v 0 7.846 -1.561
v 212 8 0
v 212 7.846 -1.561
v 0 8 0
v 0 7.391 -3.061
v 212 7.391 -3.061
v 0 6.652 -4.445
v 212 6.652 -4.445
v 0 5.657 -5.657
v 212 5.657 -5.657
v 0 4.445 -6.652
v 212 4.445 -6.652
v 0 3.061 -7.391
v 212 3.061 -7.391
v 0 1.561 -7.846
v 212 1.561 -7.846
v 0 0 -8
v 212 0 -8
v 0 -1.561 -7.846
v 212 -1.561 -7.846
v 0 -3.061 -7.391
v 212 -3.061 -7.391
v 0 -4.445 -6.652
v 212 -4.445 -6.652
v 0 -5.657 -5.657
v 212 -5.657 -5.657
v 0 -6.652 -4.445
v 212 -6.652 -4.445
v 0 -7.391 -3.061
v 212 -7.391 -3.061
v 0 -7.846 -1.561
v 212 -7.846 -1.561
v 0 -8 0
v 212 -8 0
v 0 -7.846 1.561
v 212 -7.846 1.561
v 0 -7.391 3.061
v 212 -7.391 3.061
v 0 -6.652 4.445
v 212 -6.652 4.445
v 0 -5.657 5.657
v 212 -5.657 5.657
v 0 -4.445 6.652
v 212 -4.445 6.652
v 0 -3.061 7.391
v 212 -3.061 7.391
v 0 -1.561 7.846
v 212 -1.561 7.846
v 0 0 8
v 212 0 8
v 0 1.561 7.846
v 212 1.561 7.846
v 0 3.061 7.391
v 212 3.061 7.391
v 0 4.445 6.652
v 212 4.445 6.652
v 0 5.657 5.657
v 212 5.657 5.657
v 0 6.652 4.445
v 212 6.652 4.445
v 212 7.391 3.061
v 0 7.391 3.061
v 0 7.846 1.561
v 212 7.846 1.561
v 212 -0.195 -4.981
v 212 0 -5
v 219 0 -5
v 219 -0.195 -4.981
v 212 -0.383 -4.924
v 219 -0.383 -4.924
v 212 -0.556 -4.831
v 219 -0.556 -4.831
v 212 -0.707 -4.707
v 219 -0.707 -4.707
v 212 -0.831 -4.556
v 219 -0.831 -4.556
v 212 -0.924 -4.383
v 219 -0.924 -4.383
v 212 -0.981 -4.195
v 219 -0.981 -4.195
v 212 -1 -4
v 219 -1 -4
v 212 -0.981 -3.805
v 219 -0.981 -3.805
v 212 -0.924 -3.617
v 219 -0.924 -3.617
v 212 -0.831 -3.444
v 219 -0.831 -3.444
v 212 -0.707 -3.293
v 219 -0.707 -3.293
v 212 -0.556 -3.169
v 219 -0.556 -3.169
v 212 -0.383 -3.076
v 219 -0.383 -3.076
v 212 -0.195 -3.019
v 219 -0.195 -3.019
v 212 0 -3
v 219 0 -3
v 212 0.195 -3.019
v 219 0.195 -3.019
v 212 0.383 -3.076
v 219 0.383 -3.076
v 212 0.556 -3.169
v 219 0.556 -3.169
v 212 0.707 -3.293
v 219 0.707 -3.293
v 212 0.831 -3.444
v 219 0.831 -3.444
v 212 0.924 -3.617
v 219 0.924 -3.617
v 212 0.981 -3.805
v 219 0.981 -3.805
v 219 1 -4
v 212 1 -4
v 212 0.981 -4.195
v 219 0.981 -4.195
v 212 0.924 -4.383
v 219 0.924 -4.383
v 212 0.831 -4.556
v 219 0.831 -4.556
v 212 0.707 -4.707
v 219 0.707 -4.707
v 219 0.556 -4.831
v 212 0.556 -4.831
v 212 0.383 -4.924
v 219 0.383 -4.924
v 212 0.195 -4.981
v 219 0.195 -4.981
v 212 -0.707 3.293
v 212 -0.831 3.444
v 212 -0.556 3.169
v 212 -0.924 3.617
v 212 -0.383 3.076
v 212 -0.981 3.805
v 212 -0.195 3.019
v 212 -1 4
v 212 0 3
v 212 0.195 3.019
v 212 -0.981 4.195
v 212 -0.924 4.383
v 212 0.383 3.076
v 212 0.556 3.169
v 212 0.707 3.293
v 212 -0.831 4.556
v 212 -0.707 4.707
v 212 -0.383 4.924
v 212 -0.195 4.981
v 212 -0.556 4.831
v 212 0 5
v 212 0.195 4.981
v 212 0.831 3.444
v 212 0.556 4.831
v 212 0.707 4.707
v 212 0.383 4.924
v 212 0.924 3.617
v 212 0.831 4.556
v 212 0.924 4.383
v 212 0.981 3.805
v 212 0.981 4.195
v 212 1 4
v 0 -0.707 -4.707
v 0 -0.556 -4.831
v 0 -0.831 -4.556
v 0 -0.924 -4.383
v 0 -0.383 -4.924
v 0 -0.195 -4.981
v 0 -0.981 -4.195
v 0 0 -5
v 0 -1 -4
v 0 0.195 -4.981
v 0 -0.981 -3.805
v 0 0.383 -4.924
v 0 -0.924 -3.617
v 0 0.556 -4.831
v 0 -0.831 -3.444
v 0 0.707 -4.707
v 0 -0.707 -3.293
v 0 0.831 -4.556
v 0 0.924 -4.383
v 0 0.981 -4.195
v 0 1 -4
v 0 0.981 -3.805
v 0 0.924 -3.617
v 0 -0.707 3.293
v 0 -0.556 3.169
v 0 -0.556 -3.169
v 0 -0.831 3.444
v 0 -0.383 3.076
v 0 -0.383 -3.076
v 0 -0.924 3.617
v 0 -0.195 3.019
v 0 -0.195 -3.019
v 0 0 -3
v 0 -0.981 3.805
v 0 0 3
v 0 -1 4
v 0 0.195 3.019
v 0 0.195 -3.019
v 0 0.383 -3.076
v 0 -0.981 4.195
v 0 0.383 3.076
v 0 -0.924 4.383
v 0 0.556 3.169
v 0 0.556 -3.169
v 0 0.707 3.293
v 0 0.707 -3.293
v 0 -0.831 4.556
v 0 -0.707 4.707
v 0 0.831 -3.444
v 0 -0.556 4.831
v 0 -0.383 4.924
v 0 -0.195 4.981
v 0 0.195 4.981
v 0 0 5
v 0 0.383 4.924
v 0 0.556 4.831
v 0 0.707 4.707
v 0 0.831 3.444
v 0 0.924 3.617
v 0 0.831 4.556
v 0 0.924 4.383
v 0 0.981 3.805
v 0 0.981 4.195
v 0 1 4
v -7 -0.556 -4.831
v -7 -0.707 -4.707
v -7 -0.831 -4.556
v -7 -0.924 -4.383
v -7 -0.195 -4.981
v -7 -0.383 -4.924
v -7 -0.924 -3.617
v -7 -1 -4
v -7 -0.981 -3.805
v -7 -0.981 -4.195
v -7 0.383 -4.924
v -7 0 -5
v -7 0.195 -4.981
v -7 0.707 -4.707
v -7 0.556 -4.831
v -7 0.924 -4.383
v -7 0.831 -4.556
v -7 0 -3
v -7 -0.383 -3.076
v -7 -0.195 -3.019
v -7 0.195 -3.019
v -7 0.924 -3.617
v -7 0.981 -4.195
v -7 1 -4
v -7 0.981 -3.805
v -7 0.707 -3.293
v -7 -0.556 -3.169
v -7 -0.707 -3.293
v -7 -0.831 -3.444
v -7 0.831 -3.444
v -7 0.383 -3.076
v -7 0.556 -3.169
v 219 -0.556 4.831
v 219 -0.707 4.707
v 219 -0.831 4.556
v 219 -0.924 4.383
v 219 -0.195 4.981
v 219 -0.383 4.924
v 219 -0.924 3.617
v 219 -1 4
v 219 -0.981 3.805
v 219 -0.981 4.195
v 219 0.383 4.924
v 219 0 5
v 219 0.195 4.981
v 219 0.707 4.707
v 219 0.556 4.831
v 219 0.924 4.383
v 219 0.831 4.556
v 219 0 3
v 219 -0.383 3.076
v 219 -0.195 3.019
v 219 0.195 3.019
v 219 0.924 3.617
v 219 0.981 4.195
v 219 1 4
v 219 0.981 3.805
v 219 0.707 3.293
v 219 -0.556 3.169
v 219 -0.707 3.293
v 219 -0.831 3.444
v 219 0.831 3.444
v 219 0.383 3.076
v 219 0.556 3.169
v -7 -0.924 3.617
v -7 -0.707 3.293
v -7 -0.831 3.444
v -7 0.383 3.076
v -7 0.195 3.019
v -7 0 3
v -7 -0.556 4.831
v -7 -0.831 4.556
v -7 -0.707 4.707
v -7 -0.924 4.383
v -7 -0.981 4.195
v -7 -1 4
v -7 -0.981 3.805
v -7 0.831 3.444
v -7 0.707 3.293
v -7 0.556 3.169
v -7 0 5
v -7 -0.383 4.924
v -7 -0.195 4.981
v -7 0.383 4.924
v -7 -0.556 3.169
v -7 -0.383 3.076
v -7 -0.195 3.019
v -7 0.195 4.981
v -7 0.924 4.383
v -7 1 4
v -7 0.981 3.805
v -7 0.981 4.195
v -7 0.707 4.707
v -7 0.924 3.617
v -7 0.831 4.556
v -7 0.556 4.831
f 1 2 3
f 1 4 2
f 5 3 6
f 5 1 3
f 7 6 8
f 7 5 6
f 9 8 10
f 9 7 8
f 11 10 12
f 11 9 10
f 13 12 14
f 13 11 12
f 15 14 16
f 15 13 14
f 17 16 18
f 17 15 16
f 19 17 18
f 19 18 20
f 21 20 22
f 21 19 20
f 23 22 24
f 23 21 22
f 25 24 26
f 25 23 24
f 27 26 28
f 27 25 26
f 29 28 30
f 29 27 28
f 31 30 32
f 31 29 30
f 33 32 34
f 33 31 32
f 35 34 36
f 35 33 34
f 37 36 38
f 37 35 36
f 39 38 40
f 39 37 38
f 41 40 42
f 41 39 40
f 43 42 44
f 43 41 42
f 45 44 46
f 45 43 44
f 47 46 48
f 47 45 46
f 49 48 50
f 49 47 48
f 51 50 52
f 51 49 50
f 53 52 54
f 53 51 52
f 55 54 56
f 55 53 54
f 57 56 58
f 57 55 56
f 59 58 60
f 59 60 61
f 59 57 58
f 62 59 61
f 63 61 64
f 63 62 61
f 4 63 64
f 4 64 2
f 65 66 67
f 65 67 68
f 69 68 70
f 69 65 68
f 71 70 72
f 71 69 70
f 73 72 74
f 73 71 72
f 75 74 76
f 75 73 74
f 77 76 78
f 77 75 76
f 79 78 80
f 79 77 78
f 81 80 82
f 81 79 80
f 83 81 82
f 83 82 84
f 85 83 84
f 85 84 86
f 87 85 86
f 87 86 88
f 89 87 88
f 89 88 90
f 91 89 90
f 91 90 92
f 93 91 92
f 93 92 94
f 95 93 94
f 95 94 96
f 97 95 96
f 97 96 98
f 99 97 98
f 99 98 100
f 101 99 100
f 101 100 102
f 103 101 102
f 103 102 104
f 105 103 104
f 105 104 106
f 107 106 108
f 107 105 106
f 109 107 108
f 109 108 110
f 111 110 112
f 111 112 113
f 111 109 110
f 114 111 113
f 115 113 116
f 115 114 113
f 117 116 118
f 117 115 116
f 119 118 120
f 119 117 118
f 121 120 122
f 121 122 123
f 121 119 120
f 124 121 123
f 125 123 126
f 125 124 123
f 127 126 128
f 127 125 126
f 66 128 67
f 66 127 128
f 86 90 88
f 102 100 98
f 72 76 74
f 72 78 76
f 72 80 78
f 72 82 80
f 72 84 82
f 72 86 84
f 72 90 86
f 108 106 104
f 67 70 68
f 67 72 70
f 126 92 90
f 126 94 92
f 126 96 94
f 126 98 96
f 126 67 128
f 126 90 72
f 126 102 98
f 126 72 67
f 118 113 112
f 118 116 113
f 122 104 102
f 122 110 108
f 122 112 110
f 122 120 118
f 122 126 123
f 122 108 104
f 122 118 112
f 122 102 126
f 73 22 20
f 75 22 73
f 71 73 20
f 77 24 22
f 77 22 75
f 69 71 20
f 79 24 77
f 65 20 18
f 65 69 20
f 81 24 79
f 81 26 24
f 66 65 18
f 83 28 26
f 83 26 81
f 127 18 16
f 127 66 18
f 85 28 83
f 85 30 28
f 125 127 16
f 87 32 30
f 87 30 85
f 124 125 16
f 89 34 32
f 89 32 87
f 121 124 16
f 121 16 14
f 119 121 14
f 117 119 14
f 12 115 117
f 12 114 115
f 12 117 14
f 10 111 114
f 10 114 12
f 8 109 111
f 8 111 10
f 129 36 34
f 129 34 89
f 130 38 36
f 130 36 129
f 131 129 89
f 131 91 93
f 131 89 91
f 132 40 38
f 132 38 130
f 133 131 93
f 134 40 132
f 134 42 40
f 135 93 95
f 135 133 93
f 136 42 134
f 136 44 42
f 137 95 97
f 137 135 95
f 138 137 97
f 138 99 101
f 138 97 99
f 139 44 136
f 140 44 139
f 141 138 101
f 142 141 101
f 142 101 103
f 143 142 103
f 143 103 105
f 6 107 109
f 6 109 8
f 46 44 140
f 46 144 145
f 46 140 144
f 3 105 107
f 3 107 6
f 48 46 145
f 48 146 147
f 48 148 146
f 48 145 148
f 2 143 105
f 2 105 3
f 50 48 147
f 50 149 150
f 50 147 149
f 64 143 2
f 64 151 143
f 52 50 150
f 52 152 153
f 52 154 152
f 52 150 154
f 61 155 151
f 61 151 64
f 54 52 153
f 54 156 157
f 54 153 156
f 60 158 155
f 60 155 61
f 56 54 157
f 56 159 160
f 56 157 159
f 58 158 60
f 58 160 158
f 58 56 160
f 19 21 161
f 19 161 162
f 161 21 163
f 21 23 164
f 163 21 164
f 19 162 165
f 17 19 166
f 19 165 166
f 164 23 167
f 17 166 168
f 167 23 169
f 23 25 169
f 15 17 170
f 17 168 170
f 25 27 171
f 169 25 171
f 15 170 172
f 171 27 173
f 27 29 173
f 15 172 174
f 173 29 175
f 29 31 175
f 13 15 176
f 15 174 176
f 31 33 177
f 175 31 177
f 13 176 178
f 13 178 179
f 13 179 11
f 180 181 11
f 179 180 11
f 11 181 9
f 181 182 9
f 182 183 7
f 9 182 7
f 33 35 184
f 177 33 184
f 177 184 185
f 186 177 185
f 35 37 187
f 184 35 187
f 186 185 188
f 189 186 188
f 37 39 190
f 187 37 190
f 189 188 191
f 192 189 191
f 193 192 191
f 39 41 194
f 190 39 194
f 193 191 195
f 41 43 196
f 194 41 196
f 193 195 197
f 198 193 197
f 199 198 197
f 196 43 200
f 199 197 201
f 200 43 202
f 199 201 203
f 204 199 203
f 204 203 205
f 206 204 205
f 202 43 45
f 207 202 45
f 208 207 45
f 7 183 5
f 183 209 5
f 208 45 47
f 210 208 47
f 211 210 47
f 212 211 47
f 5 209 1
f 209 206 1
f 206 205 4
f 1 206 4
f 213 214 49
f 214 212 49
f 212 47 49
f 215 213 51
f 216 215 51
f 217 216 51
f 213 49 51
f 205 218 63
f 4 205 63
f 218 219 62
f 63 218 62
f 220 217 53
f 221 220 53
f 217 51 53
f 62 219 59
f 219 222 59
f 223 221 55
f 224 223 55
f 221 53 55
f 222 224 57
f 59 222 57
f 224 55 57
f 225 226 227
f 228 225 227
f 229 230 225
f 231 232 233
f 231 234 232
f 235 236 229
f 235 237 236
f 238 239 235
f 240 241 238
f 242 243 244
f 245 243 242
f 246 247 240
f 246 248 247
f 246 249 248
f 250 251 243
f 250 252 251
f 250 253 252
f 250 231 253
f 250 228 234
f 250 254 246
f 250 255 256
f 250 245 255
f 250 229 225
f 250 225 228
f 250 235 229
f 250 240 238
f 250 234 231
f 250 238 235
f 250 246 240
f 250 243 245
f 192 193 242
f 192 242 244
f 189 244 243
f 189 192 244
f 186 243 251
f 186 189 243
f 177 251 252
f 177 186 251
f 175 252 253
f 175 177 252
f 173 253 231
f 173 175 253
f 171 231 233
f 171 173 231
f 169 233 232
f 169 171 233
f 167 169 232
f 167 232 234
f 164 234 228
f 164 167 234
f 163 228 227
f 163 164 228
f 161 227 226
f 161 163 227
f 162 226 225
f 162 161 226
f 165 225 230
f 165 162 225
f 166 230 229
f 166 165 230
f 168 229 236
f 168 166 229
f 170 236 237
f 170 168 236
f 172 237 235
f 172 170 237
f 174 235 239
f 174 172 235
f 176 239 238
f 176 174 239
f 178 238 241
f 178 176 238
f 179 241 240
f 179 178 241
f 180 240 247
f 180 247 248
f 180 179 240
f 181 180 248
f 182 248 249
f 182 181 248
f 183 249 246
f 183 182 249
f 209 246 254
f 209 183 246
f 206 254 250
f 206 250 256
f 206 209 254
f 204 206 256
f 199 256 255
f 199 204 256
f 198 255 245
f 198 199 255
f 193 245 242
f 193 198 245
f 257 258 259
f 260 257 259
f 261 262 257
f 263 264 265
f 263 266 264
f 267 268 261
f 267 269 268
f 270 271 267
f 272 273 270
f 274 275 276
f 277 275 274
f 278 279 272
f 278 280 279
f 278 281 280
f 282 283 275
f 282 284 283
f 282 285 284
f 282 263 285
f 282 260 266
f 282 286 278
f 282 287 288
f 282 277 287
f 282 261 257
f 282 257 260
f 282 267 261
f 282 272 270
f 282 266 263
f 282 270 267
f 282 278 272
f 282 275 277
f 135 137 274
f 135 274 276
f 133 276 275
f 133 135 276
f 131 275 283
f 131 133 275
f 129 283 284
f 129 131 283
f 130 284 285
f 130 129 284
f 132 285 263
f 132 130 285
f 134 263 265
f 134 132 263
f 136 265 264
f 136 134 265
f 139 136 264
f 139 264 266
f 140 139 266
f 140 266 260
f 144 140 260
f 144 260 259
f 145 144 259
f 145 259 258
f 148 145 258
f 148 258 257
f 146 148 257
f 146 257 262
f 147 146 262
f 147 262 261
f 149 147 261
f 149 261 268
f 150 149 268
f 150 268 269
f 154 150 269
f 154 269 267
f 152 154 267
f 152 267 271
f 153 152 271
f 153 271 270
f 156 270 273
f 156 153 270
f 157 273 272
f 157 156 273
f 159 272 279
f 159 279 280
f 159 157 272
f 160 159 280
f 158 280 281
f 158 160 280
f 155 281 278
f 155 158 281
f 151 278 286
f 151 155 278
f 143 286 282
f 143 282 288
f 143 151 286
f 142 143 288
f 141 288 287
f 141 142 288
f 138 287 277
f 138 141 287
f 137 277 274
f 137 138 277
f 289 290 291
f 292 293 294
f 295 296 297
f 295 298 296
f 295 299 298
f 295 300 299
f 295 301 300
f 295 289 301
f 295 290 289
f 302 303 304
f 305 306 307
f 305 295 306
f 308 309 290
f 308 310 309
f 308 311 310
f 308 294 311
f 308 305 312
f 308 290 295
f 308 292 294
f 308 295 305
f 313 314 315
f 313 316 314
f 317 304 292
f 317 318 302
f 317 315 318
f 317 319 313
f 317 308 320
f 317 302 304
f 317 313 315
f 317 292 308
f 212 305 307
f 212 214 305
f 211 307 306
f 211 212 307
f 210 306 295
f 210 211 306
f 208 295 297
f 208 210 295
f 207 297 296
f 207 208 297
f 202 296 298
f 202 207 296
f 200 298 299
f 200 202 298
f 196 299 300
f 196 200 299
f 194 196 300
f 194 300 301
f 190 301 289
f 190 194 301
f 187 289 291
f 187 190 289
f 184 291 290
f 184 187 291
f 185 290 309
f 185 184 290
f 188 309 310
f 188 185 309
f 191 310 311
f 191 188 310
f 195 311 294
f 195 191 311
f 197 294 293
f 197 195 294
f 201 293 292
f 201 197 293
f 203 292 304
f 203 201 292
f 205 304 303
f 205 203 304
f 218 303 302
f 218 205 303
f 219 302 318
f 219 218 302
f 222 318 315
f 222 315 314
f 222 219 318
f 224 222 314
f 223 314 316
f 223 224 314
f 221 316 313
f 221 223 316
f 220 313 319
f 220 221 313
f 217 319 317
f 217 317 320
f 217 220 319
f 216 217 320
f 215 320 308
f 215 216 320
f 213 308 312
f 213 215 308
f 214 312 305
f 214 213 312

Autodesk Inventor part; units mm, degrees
ref_plane "YZ Plane" through (0, 0, 0) normal (1, 0, 0) x (0, 1, 0)
ref_plane "XZ Plane" through (0, 0, 0) normal (0, 1, 0) x (-1, 0, 0)
ref_plane "XY Plane" through (0, 0, 0) normal (0, 0, 1) x (1, 0, 0)
sketch "Szkic1" plane through (0, 0, 0) normal (1, 0, 0) x (0, 1, 0)
  line L0 (-11.2, 0) -> (11.2, 0) projected
  line L1 (0, -11.2) -> (0, 11.2) projected
  circle A0 centre (0, 0) radius 8
  dimension "d0" = 16
extrude "Wyciągnięcie proste1" add sketch "Szkic1" along normal blind 212
sketch "Szkic2" plane through (212, 0, 0) normal (1, 0, 0) x (0, 0, -1)
  circle A0 centre (0, 0) radius 8 projected
  line L0 (0, -11.2) -> (0, 11.2) projected
  line L1 (16, 0) -> (-12, 0) projected
  circle A1 centre (-4, 0) radius 1
  circle A2 centre (4, 0) radius 1
  point P0 (12, 0)
  dimension "d4" = 16
  dimension "d5" = 2
  dimension "d8" = 8
extrude "Wyciągnięcie proste2" add sketch "Szkic2" along normal blind 7 contours A2 L1 | L1 A2 | A1 L1 | L1 A1
sketch "Szkic3" plane through (0, 0, 0) normal (-1, 0, 0) x (0, 0, 1)
  circle A0 centre (0, 0) radius 8 projected
  line L0 (-11.2, 0) -> (11.2, 0) projected
  line L1 (0, -11.2) -> (0, 11.2) projected
  circle A1 centre (-4, 0) radius 1
  circle A2 centre (4, 0) radius 1
  dimension "d19" = 10
  dimension "d15" = 2
  dimension "d16" = 16
  dimension "d22" = 8
extrude "Wyciągnięcie proste3" add sketch "Szkic3" along normal blind 7 contours A2 L0 | L0 A2 | A1 L0 | L0 A1
equation "\"d8\" = 0.5 * d4"
equation "\"d22\" = 0.5 * d16"
properties part number "świetlówka"
